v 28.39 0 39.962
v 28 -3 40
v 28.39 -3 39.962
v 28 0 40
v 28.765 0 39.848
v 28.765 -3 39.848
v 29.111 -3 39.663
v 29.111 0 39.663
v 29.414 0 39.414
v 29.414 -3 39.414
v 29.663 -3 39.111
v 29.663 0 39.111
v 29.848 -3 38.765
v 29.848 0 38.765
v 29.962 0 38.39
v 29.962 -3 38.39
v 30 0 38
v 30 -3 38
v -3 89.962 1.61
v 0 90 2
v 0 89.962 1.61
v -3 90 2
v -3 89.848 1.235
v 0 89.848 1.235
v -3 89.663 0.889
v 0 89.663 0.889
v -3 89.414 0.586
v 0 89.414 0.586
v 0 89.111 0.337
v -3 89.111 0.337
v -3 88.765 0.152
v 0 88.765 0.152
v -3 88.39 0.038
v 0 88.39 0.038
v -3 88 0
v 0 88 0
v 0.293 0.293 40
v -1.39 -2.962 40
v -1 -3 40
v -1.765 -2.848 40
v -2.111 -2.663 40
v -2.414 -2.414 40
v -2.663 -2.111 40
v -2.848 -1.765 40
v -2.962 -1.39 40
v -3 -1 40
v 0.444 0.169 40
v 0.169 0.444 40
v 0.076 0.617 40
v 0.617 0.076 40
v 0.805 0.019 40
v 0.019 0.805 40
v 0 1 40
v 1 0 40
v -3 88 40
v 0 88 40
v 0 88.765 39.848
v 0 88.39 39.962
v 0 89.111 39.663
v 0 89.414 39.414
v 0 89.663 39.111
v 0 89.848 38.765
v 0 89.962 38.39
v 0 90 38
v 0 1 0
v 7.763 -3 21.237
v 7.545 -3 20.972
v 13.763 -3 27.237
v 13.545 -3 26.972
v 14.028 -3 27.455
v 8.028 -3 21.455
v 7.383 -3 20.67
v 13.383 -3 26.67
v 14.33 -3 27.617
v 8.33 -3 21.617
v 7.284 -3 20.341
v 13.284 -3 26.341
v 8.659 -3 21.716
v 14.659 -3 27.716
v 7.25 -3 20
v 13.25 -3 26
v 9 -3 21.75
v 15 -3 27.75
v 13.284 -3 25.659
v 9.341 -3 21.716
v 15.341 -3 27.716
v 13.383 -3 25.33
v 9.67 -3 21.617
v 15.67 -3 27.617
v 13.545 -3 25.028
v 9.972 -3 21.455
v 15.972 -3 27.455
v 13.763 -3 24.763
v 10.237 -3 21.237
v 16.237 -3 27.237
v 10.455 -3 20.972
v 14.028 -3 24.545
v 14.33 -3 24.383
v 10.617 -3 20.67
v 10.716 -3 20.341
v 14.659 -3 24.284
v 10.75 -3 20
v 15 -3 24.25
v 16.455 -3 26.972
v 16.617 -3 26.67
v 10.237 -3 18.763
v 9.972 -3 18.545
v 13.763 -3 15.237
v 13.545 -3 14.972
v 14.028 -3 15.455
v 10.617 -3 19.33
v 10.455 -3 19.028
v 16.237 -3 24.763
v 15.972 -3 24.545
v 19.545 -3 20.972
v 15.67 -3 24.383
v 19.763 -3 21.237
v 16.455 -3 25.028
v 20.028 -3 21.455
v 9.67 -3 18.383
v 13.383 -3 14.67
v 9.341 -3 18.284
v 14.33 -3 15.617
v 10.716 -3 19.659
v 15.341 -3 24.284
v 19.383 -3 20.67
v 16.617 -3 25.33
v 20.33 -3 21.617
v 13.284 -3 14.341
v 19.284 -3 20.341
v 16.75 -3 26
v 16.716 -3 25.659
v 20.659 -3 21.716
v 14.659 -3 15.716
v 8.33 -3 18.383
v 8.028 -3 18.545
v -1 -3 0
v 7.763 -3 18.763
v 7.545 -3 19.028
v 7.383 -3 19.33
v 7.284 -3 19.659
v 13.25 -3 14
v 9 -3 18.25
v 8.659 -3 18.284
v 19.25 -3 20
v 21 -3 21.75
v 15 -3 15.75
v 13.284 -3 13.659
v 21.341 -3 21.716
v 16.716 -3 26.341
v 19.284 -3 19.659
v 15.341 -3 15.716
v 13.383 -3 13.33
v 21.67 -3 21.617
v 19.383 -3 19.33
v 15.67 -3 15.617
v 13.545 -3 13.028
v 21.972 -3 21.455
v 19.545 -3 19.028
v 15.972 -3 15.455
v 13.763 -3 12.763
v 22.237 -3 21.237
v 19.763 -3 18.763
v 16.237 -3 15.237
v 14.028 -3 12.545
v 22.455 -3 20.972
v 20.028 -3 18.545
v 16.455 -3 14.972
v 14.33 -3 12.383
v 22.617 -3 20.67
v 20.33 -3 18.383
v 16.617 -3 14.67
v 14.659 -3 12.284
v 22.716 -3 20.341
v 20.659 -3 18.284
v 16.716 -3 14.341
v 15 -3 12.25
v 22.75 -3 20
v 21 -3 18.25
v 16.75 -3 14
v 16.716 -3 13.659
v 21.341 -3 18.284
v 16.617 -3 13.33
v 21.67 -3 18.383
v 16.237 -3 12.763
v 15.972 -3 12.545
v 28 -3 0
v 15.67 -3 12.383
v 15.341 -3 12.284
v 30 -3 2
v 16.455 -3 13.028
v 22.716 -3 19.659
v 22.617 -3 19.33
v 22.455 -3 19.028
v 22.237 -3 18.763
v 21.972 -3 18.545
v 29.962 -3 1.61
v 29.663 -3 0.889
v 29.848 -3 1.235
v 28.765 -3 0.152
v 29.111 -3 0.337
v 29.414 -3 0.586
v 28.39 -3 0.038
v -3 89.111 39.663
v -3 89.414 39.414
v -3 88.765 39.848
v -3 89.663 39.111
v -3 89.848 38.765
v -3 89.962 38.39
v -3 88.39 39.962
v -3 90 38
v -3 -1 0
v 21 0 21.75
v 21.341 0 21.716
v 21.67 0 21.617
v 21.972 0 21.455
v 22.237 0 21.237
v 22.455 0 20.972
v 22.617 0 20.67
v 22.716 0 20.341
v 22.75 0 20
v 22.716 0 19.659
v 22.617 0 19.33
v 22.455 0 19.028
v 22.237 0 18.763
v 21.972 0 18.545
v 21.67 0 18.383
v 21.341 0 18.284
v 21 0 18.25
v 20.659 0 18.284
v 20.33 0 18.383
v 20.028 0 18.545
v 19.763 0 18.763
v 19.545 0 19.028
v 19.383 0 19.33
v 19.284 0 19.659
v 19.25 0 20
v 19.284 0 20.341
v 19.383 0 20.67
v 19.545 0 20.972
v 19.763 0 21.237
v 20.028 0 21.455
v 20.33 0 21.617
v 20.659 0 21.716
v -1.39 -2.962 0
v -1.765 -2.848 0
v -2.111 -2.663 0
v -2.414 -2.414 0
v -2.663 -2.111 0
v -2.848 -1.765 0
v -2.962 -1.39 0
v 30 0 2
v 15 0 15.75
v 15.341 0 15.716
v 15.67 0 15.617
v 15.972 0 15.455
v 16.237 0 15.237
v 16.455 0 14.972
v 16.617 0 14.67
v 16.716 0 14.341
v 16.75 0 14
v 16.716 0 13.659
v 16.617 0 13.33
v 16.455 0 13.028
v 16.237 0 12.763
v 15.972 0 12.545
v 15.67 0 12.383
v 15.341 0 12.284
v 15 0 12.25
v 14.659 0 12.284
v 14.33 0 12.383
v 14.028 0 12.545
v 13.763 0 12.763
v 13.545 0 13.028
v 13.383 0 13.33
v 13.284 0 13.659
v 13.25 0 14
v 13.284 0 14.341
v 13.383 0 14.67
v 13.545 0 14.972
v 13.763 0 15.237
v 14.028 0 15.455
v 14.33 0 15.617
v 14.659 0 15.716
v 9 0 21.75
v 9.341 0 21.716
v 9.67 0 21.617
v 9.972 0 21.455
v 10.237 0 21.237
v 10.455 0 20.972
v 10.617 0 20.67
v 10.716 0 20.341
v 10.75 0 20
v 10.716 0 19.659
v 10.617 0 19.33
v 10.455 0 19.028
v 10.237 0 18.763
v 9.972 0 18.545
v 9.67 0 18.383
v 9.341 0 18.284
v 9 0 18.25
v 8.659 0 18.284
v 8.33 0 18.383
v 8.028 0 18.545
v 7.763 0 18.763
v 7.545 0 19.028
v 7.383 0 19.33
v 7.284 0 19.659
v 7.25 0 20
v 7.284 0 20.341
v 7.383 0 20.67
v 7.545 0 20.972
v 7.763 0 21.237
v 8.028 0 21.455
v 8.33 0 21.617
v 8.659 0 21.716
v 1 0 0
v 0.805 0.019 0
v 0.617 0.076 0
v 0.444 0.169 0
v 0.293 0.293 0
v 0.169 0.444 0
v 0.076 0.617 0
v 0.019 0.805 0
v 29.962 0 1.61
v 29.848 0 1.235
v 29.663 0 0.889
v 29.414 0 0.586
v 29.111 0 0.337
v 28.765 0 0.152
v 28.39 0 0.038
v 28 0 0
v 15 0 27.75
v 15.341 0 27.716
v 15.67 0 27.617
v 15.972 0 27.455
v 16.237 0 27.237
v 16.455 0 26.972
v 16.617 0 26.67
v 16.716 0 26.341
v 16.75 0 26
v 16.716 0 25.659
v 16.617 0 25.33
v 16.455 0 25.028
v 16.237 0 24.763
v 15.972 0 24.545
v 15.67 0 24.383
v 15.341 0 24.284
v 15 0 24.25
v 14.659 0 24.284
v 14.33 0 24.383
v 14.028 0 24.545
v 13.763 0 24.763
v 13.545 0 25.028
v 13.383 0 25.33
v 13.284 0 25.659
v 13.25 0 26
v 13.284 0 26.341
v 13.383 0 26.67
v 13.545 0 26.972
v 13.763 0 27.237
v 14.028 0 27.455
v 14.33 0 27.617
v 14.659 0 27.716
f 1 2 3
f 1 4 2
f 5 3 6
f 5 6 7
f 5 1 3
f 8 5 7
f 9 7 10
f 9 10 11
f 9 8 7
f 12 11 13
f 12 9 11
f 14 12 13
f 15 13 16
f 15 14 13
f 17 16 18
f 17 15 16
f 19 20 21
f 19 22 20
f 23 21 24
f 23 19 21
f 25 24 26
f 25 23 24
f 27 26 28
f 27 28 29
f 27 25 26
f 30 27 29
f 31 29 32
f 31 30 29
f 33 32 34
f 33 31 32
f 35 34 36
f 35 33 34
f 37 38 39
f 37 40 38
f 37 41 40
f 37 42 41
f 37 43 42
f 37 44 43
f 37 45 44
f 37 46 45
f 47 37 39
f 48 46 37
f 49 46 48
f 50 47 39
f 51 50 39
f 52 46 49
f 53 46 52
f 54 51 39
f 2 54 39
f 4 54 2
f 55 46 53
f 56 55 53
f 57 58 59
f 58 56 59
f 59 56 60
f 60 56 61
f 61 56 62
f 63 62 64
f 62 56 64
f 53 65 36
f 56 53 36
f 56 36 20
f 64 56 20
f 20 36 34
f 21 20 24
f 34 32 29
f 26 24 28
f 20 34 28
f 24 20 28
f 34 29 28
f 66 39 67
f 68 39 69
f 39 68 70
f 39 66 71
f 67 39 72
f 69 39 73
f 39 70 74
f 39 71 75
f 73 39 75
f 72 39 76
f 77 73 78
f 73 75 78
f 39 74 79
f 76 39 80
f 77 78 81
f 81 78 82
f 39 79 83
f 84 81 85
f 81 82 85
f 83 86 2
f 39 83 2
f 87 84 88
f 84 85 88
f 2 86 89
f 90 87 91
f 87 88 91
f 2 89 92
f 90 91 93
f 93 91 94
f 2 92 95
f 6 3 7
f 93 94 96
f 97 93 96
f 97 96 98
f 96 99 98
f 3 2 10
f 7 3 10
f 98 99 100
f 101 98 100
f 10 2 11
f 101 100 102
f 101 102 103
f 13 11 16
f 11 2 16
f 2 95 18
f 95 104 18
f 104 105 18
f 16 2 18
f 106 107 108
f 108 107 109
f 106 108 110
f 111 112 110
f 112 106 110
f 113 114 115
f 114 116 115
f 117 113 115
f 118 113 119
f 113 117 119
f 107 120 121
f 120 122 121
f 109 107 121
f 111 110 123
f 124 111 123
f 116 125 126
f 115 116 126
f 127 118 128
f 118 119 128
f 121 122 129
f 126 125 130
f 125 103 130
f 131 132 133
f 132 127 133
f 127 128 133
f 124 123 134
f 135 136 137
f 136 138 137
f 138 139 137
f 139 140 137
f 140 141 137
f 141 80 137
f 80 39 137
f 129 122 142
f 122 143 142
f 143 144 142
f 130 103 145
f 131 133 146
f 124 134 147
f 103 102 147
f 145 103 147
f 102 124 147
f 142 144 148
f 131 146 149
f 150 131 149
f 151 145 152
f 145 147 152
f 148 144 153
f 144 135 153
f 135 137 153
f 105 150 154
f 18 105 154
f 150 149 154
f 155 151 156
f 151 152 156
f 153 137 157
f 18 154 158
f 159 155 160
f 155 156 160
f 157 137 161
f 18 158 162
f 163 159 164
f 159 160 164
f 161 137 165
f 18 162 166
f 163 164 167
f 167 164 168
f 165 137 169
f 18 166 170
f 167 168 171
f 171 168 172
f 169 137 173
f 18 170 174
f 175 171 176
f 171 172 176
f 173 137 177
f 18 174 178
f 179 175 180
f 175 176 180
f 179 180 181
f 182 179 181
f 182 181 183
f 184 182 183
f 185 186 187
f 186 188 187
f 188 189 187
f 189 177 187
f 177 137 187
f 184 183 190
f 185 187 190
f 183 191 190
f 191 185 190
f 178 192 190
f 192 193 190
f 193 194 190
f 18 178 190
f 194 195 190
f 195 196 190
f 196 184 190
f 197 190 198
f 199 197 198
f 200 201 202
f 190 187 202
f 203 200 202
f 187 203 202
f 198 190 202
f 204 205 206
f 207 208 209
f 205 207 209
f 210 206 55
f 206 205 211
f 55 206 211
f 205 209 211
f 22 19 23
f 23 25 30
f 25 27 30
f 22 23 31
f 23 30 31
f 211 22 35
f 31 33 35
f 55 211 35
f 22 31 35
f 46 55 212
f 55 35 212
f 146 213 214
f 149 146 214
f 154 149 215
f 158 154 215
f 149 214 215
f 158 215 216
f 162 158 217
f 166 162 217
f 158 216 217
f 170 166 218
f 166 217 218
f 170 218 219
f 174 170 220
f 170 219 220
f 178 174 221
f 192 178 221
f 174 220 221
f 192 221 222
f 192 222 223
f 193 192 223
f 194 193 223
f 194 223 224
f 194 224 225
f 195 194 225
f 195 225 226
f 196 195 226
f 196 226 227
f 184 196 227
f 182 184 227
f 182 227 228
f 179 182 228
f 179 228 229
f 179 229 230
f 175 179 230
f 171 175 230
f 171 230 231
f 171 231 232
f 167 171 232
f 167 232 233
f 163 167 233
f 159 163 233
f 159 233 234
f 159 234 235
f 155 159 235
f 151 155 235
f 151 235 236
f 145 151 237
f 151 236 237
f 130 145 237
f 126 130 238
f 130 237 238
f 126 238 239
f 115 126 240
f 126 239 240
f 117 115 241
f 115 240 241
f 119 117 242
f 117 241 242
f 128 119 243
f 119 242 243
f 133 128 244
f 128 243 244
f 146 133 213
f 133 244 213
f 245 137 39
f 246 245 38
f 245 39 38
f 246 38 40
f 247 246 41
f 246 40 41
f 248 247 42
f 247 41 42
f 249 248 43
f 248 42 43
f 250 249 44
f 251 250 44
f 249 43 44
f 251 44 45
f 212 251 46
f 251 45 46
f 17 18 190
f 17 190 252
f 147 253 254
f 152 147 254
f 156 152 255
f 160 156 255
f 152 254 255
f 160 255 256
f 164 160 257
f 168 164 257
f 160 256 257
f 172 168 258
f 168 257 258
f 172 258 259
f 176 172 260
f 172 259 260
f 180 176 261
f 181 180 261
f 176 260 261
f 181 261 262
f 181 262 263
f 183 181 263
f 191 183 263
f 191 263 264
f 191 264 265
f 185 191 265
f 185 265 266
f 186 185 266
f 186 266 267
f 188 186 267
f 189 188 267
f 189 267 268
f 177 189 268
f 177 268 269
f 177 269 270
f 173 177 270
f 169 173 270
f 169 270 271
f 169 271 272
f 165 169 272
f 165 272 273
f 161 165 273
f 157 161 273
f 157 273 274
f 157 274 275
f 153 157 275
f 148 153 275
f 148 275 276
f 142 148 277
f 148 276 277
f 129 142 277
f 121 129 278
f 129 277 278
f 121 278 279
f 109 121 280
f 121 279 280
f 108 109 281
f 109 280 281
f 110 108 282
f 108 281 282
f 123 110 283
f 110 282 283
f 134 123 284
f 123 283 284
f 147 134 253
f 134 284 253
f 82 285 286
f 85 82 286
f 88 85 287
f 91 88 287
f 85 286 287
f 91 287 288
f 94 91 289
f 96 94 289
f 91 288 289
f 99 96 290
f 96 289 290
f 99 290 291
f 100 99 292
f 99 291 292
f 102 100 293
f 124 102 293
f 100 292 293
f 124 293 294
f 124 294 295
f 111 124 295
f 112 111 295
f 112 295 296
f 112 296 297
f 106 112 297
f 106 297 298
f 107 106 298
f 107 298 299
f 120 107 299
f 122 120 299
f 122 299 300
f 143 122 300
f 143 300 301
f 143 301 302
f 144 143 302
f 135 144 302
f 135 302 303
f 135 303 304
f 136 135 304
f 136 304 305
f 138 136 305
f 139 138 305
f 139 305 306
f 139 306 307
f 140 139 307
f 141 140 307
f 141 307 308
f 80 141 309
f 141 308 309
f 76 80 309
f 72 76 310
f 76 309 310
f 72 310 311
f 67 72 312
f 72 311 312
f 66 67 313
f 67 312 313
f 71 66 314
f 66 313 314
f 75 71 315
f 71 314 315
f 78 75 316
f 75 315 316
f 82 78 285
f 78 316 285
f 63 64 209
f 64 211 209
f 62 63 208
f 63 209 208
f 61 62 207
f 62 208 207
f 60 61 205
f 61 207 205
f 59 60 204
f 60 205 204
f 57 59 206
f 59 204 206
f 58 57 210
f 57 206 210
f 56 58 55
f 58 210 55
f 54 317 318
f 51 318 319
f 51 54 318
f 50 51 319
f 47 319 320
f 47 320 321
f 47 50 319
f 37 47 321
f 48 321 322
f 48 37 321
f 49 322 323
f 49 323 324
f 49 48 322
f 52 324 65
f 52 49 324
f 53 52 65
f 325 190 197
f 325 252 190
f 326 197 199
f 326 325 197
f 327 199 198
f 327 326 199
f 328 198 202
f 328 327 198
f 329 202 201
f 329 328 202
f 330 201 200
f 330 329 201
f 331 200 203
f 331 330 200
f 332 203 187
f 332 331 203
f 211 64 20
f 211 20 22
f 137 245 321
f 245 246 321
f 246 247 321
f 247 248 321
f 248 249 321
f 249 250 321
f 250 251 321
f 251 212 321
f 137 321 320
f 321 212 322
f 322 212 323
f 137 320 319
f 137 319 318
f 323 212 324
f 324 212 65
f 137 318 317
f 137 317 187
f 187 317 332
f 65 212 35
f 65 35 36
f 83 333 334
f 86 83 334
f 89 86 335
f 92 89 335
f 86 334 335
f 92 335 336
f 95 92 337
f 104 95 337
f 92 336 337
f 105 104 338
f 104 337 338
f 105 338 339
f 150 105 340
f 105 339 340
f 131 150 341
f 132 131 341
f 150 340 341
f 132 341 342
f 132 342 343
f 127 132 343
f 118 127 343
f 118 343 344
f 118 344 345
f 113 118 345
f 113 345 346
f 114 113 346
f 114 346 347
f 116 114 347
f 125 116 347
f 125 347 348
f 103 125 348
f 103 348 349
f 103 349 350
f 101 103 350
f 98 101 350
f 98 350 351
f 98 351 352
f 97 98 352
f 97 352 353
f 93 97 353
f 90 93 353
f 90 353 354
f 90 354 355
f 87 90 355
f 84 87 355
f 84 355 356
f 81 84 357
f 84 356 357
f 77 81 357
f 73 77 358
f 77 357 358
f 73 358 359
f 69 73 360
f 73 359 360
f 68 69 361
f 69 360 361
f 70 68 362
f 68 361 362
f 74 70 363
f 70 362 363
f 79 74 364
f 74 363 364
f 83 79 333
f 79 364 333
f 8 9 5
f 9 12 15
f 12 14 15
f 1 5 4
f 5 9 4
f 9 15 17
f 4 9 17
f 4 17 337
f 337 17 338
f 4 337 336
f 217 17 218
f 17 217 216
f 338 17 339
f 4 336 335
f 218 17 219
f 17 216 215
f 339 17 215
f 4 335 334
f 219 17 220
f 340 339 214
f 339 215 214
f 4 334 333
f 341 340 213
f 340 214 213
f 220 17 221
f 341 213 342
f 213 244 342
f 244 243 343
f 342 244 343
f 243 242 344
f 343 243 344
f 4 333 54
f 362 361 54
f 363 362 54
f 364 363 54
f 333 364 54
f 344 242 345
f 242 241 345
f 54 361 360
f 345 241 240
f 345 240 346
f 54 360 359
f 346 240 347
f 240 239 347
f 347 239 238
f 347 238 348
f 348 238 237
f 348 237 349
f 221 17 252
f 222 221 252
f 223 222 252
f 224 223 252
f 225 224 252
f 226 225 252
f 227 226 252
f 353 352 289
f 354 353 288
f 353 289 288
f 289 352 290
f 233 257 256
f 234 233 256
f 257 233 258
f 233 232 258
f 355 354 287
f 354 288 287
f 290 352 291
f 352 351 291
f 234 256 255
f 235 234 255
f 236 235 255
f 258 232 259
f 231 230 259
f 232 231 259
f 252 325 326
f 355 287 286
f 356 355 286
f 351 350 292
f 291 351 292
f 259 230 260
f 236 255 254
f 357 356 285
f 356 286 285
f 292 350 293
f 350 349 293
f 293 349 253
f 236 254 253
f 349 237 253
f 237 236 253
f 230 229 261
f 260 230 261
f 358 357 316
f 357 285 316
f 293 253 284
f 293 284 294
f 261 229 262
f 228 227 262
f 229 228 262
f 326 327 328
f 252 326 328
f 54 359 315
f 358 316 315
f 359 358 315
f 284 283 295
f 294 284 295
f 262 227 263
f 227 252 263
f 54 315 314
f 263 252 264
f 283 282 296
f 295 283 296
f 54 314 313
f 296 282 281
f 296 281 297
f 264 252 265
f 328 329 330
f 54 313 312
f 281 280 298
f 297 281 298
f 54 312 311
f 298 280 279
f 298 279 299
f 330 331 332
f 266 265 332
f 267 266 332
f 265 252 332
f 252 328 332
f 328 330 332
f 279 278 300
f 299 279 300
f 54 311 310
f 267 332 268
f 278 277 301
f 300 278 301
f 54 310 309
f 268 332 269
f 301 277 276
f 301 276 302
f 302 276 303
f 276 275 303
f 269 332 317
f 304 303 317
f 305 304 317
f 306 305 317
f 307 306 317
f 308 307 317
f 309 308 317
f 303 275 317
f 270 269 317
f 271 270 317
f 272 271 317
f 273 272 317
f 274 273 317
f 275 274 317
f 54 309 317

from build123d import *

# Parameters (mm, degrees)
EXTRU_MINCE1_DEPTH      = 40
CONG_1_R                = 1
CONG_2_R                = 2
CONG_3_R                = 2
CONG_4_R                = 2
CONG_5_R                = 2
CONG_6_R                = 2
ESQUISSE3_R             = 1.75
ENL_V_MAT_EXTRU_2_DEPTH = 10


with BuildPart() as part:
    # Esquisse1 → Extru.-Mince1 (new body)
    with BuildSketch(Plane.XY):
        Polygon((30, 0), (0, 0), (0, 90), (-3, 90), (-3, -3), (30, -3), align=None)
    extrude(amount=EXTRU_MINCE1_DEPTH)

    # Congé1
    cong_1_edges = [part.edges().sort_by_distance(p)[0] for p in [
        (0, 0, 20),
    ]]
    fillet(cong_1_edges, radius=CONG_1_R)

    # Congé2
    cong_2_edges = [part.edges().sort_by_distance(p)[0] for p in [
        (-3, -3, 20),
    ]]
    fillet(cong_2_edges, radius=CONG_2_R)

    # Congé3
    cong_3_edges = [part.edges().sort_by_distance(p)[0] for p in [
        (-1.5, 90, 40),
    ]]
    fillet(cong_3_edges, radius=CONG_3_R)

    # Congé4
    cong_4_edges = [part.edges().sort_by_distance(p)[0] for p in [
        (-1.5, 90, 0),
    ]]
    fillet(cong_4_edges, radius=CONG_4_R)

    # Congé5
    cong_5_edges = [part.edges().sort_by_distance(p)[0] for p in [
        (30, -1.5, 40),
    ]]
    fillet(cong_5_edges, radius=CONG_5_R)

    # Congé6
    cong_6_edges = [part.edges().sort_by_distance(p)[0] for p in [
        (30, -1.5, 0),
    ]]
    fillet(cong_6_edges, radius=CONG_6_R)

    # Esquisse3 → Enlèv. mat.-Extru.2 (cut)
    with BuildSketch(Plane(origin=(0, 0, 0), x_dir=(1, 0, 0), z_dir=(0, 1, 0))):
        with Locations(Location((15, -14, 0), (0, 0, 270))):
            Circle(ESQUISSE3_R)
        with Locations(Location((15, -26, 0), (0, 0, 270))):
            Circle(ESQUISSE3_R)
        with Locations(Location((21, -20, 0), (0, 0, 270))):
            Circle(ESQUISSE3_R)
        with Locations(Location((9, -20, 0), (0, 0, 270))):
            Circle(ESQUISSE3_R)
    extrude(amount=-ENL_V_MAT_EXTRU_2_DEPTH, mode=Mode.SUBTRACT)


solid = part.part
